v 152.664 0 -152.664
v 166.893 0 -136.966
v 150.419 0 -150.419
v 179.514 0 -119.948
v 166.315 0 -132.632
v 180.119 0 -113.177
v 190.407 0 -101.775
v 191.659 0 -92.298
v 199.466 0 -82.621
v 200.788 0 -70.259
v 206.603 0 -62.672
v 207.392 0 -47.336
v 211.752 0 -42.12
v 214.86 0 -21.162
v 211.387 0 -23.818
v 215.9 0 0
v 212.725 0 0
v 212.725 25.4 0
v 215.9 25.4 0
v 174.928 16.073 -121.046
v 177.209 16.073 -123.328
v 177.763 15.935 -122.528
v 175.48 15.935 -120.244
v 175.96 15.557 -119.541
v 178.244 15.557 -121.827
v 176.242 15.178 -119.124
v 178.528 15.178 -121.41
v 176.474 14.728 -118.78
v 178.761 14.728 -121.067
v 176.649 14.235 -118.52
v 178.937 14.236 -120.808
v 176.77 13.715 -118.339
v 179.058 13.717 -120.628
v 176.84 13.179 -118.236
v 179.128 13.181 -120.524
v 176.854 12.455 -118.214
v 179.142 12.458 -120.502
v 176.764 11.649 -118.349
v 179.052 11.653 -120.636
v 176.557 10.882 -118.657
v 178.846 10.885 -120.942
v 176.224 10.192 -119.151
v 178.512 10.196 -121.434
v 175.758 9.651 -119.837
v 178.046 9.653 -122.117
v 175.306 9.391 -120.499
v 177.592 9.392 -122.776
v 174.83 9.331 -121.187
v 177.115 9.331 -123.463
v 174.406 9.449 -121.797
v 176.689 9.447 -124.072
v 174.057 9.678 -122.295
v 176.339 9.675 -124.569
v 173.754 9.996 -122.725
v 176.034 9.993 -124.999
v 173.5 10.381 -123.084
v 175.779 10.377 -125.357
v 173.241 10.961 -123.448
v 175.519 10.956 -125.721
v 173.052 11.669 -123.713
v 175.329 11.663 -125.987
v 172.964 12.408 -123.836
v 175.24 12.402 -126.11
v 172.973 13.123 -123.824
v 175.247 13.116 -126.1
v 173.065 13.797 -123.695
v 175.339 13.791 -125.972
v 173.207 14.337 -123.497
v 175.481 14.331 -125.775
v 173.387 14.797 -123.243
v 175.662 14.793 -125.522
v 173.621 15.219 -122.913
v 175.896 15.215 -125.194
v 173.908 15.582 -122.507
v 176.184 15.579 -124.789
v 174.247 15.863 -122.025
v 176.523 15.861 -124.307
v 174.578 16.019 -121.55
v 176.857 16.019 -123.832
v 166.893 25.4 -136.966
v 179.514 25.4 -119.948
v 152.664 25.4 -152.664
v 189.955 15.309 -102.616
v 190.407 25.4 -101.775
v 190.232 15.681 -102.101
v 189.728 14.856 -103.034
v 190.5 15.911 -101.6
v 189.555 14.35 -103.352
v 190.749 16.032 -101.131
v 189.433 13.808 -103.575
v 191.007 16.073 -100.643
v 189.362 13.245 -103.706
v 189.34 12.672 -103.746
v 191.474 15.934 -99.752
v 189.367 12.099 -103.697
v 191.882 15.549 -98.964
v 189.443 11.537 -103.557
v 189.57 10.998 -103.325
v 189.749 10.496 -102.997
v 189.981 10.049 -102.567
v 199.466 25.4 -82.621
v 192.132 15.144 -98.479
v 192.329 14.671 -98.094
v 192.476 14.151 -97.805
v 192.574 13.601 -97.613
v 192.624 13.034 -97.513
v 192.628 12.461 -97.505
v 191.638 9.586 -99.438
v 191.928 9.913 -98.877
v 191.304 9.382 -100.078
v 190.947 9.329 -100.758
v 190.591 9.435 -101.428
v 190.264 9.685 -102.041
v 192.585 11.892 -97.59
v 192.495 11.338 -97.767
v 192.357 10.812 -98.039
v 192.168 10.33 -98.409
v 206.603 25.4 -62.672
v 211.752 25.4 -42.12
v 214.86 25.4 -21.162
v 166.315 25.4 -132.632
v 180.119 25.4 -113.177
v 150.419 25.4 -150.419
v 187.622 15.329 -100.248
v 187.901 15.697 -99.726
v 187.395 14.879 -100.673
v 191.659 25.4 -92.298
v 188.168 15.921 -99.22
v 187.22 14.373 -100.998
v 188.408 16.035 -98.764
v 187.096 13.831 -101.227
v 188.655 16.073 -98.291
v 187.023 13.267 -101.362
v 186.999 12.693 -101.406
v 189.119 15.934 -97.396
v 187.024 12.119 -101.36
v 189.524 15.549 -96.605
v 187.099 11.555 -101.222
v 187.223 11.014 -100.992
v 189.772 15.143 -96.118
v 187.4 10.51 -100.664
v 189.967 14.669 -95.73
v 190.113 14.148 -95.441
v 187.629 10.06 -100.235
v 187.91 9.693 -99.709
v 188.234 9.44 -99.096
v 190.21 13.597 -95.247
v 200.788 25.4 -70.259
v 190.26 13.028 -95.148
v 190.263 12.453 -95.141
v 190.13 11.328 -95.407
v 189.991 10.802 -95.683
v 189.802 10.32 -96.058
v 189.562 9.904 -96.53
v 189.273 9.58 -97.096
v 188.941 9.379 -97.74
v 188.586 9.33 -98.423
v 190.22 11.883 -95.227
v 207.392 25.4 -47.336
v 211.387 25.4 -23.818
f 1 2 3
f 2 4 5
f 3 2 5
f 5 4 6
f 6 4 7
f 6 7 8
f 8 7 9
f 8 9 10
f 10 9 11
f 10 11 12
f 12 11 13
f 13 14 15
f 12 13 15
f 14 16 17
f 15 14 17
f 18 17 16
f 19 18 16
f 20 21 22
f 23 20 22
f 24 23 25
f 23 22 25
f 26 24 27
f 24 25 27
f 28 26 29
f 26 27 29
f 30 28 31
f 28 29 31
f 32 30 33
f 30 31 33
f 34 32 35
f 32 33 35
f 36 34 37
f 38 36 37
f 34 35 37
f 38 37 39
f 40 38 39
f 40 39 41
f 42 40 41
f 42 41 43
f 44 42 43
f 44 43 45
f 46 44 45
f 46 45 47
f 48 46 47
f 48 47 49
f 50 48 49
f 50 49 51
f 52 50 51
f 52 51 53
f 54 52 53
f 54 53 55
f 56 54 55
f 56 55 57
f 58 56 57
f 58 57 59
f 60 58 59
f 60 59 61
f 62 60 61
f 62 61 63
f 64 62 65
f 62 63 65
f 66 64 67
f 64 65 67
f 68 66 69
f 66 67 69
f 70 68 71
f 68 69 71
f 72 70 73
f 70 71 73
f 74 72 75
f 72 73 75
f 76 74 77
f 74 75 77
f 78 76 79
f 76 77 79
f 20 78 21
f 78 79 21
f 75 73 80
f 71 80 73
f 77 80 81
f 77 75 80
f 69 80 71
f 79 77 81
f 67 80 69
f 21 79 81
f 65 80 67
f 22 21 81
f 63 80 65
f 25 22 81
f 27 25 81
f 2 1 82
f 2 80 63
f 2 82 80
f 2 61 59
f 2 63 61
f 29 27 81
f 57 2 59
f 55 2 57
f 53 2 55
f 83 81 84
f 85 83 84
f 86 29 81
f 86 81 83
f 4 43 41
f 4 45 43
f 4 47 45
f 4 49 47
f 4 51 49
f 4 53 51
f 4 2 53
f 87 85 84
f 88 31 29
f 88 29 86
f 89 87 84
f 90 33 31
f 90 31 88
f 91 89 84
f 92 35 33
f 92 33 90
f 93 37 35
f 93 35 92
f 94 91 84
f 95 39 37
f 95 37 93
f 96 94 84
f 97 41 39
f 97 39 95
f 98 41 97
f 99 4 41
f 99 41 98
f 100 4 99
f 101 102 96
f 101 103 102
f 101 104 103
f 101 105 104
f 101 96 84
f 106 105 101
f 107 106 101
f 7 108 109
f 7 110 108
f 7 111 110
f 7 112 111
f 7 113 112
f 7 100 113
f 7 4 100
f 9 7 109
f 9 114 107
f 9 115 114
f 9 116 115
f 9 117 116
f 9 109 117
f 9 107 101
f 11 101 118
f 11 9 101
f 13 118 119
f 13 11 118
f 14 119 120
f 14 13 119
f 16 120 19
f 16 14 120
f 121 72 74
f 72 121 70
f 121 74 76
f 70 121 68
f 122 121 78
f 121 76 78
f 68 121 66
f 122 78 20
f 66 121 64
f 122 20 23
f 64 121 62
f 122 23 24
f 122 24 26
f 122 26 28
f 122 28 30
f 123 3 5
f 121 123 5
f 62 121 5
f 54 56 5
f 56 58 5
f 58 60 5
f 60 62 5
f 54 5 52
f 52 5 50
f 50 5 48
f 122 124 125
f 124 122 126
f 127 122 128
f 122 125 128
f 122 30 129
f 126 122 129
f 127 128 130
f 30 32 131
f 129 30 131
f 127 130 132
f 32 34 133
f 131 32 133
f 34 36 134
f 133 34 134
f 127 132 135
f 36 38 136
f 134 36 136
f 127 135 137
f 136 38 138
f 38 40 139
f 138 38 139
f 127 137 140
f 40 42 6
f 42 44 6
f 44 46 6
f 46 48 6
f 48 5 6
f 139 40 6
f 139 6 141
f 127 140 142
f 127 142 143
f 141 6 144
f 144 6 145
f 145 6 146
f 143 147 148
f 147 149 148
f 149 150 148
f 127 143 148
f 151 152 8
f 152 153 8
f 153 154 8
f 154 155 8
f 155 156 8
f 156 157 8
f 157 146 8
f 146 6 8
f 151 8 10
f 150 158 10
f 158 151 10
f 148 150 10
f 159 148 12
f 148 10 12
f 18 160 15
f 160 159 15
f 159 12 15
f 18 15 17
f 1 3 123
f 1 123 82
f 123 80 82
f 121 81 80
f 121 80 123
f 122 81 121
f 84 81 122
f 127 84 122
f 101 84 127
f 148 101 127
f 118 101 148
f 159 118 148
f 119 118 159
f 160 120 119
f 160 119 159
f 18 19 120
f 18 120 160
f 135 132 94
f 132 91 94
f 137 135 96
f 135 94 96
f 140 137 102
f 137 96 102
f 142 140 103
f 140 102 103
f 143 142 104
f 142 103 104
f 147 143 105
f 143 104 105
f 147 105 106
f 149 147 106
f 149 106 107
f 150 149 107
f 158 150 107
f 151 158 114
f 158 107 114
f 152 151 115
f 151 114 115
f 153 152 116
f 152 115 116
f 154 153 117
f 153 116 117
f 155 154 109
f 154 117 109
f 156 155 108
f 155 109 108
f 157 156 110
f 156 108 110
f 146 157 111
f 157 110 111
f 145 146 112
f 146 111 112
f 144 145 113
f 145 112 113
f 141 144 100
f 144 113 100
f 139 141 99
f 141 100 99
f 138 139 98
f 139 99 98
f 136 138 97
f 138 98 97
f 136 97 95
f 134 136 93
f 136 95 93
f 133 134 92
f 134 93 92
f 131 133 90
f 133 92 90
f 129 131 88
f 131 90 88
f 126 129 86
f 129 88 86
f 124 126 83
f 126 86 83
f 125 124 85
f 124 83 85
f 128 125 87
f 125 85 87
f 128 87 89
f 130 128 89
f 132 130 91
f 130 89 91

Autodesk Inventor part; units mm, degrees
ref_plane "YZ Plane" through (0, 0, 0) normal (1, 0, 0) x (0, 1, 0)
ref_plane "XZ Plane" through (0, 0, 0) normal (0, 1, 0) x (-1, 0, 0)
ref_plane "XY Plane" through (0, 0, 0) normal (0, 0, 1) x (1, 0, 0)
sketch "Sketch1" plane through (0, 0, 0) normal (0, 1, 0) x (-1, 0, 0)
  arc A0 (-215.9, 0) -> (-152.6644, -152.6644) centre (0, 0) ccw
  arc A1 (-212.725, 0) -> (-150.4193, -150.4193) centre (0, 0) ccw
  line L0 (-150.4193, -150.4193) -> (-152.6644, -152.6644)
  line L1 (-212.725, 0) -> (-215.9, 0)
  dimension "d0" = 431.8
  dimension "d1" = 3.175
  dimension "d2" = 45
extrude "Extrusion1" add sketch "Sketch1" along normal blind 25.4
ref_plane "Work Plane1" through (152.6644, 0, -152.6644) normal (0.7071, 0, -0.7071) x (0, 1, 0)
sketch "Sketch2" plane through (152.6644, 0, -152.6644) normal (0.7071, 0, -0.7071) x (0, 1, 0)
  circle A0 centre (12.7, 38.1) radius 3.3734
  line L0 (0, 0) -> (25.4, 0) projected
  circle A1 centre (12.7, 63.8969) radius 3.3734
  line L1 (25.4, 150.4193) -> (25.4, 0) projected
  dimension "d5" = 6.7469
  dimension "d6" = 38.1
  dimension "d7" = 6.7469
  dimension "d8" = 19.05
  dimension "d9" = 12.7
  dimension "d10" = 12.7
extrude "Extrusion2" cut sketch "Sketch2" against normal blind 17.78
properties material "Aluminum 6061"
